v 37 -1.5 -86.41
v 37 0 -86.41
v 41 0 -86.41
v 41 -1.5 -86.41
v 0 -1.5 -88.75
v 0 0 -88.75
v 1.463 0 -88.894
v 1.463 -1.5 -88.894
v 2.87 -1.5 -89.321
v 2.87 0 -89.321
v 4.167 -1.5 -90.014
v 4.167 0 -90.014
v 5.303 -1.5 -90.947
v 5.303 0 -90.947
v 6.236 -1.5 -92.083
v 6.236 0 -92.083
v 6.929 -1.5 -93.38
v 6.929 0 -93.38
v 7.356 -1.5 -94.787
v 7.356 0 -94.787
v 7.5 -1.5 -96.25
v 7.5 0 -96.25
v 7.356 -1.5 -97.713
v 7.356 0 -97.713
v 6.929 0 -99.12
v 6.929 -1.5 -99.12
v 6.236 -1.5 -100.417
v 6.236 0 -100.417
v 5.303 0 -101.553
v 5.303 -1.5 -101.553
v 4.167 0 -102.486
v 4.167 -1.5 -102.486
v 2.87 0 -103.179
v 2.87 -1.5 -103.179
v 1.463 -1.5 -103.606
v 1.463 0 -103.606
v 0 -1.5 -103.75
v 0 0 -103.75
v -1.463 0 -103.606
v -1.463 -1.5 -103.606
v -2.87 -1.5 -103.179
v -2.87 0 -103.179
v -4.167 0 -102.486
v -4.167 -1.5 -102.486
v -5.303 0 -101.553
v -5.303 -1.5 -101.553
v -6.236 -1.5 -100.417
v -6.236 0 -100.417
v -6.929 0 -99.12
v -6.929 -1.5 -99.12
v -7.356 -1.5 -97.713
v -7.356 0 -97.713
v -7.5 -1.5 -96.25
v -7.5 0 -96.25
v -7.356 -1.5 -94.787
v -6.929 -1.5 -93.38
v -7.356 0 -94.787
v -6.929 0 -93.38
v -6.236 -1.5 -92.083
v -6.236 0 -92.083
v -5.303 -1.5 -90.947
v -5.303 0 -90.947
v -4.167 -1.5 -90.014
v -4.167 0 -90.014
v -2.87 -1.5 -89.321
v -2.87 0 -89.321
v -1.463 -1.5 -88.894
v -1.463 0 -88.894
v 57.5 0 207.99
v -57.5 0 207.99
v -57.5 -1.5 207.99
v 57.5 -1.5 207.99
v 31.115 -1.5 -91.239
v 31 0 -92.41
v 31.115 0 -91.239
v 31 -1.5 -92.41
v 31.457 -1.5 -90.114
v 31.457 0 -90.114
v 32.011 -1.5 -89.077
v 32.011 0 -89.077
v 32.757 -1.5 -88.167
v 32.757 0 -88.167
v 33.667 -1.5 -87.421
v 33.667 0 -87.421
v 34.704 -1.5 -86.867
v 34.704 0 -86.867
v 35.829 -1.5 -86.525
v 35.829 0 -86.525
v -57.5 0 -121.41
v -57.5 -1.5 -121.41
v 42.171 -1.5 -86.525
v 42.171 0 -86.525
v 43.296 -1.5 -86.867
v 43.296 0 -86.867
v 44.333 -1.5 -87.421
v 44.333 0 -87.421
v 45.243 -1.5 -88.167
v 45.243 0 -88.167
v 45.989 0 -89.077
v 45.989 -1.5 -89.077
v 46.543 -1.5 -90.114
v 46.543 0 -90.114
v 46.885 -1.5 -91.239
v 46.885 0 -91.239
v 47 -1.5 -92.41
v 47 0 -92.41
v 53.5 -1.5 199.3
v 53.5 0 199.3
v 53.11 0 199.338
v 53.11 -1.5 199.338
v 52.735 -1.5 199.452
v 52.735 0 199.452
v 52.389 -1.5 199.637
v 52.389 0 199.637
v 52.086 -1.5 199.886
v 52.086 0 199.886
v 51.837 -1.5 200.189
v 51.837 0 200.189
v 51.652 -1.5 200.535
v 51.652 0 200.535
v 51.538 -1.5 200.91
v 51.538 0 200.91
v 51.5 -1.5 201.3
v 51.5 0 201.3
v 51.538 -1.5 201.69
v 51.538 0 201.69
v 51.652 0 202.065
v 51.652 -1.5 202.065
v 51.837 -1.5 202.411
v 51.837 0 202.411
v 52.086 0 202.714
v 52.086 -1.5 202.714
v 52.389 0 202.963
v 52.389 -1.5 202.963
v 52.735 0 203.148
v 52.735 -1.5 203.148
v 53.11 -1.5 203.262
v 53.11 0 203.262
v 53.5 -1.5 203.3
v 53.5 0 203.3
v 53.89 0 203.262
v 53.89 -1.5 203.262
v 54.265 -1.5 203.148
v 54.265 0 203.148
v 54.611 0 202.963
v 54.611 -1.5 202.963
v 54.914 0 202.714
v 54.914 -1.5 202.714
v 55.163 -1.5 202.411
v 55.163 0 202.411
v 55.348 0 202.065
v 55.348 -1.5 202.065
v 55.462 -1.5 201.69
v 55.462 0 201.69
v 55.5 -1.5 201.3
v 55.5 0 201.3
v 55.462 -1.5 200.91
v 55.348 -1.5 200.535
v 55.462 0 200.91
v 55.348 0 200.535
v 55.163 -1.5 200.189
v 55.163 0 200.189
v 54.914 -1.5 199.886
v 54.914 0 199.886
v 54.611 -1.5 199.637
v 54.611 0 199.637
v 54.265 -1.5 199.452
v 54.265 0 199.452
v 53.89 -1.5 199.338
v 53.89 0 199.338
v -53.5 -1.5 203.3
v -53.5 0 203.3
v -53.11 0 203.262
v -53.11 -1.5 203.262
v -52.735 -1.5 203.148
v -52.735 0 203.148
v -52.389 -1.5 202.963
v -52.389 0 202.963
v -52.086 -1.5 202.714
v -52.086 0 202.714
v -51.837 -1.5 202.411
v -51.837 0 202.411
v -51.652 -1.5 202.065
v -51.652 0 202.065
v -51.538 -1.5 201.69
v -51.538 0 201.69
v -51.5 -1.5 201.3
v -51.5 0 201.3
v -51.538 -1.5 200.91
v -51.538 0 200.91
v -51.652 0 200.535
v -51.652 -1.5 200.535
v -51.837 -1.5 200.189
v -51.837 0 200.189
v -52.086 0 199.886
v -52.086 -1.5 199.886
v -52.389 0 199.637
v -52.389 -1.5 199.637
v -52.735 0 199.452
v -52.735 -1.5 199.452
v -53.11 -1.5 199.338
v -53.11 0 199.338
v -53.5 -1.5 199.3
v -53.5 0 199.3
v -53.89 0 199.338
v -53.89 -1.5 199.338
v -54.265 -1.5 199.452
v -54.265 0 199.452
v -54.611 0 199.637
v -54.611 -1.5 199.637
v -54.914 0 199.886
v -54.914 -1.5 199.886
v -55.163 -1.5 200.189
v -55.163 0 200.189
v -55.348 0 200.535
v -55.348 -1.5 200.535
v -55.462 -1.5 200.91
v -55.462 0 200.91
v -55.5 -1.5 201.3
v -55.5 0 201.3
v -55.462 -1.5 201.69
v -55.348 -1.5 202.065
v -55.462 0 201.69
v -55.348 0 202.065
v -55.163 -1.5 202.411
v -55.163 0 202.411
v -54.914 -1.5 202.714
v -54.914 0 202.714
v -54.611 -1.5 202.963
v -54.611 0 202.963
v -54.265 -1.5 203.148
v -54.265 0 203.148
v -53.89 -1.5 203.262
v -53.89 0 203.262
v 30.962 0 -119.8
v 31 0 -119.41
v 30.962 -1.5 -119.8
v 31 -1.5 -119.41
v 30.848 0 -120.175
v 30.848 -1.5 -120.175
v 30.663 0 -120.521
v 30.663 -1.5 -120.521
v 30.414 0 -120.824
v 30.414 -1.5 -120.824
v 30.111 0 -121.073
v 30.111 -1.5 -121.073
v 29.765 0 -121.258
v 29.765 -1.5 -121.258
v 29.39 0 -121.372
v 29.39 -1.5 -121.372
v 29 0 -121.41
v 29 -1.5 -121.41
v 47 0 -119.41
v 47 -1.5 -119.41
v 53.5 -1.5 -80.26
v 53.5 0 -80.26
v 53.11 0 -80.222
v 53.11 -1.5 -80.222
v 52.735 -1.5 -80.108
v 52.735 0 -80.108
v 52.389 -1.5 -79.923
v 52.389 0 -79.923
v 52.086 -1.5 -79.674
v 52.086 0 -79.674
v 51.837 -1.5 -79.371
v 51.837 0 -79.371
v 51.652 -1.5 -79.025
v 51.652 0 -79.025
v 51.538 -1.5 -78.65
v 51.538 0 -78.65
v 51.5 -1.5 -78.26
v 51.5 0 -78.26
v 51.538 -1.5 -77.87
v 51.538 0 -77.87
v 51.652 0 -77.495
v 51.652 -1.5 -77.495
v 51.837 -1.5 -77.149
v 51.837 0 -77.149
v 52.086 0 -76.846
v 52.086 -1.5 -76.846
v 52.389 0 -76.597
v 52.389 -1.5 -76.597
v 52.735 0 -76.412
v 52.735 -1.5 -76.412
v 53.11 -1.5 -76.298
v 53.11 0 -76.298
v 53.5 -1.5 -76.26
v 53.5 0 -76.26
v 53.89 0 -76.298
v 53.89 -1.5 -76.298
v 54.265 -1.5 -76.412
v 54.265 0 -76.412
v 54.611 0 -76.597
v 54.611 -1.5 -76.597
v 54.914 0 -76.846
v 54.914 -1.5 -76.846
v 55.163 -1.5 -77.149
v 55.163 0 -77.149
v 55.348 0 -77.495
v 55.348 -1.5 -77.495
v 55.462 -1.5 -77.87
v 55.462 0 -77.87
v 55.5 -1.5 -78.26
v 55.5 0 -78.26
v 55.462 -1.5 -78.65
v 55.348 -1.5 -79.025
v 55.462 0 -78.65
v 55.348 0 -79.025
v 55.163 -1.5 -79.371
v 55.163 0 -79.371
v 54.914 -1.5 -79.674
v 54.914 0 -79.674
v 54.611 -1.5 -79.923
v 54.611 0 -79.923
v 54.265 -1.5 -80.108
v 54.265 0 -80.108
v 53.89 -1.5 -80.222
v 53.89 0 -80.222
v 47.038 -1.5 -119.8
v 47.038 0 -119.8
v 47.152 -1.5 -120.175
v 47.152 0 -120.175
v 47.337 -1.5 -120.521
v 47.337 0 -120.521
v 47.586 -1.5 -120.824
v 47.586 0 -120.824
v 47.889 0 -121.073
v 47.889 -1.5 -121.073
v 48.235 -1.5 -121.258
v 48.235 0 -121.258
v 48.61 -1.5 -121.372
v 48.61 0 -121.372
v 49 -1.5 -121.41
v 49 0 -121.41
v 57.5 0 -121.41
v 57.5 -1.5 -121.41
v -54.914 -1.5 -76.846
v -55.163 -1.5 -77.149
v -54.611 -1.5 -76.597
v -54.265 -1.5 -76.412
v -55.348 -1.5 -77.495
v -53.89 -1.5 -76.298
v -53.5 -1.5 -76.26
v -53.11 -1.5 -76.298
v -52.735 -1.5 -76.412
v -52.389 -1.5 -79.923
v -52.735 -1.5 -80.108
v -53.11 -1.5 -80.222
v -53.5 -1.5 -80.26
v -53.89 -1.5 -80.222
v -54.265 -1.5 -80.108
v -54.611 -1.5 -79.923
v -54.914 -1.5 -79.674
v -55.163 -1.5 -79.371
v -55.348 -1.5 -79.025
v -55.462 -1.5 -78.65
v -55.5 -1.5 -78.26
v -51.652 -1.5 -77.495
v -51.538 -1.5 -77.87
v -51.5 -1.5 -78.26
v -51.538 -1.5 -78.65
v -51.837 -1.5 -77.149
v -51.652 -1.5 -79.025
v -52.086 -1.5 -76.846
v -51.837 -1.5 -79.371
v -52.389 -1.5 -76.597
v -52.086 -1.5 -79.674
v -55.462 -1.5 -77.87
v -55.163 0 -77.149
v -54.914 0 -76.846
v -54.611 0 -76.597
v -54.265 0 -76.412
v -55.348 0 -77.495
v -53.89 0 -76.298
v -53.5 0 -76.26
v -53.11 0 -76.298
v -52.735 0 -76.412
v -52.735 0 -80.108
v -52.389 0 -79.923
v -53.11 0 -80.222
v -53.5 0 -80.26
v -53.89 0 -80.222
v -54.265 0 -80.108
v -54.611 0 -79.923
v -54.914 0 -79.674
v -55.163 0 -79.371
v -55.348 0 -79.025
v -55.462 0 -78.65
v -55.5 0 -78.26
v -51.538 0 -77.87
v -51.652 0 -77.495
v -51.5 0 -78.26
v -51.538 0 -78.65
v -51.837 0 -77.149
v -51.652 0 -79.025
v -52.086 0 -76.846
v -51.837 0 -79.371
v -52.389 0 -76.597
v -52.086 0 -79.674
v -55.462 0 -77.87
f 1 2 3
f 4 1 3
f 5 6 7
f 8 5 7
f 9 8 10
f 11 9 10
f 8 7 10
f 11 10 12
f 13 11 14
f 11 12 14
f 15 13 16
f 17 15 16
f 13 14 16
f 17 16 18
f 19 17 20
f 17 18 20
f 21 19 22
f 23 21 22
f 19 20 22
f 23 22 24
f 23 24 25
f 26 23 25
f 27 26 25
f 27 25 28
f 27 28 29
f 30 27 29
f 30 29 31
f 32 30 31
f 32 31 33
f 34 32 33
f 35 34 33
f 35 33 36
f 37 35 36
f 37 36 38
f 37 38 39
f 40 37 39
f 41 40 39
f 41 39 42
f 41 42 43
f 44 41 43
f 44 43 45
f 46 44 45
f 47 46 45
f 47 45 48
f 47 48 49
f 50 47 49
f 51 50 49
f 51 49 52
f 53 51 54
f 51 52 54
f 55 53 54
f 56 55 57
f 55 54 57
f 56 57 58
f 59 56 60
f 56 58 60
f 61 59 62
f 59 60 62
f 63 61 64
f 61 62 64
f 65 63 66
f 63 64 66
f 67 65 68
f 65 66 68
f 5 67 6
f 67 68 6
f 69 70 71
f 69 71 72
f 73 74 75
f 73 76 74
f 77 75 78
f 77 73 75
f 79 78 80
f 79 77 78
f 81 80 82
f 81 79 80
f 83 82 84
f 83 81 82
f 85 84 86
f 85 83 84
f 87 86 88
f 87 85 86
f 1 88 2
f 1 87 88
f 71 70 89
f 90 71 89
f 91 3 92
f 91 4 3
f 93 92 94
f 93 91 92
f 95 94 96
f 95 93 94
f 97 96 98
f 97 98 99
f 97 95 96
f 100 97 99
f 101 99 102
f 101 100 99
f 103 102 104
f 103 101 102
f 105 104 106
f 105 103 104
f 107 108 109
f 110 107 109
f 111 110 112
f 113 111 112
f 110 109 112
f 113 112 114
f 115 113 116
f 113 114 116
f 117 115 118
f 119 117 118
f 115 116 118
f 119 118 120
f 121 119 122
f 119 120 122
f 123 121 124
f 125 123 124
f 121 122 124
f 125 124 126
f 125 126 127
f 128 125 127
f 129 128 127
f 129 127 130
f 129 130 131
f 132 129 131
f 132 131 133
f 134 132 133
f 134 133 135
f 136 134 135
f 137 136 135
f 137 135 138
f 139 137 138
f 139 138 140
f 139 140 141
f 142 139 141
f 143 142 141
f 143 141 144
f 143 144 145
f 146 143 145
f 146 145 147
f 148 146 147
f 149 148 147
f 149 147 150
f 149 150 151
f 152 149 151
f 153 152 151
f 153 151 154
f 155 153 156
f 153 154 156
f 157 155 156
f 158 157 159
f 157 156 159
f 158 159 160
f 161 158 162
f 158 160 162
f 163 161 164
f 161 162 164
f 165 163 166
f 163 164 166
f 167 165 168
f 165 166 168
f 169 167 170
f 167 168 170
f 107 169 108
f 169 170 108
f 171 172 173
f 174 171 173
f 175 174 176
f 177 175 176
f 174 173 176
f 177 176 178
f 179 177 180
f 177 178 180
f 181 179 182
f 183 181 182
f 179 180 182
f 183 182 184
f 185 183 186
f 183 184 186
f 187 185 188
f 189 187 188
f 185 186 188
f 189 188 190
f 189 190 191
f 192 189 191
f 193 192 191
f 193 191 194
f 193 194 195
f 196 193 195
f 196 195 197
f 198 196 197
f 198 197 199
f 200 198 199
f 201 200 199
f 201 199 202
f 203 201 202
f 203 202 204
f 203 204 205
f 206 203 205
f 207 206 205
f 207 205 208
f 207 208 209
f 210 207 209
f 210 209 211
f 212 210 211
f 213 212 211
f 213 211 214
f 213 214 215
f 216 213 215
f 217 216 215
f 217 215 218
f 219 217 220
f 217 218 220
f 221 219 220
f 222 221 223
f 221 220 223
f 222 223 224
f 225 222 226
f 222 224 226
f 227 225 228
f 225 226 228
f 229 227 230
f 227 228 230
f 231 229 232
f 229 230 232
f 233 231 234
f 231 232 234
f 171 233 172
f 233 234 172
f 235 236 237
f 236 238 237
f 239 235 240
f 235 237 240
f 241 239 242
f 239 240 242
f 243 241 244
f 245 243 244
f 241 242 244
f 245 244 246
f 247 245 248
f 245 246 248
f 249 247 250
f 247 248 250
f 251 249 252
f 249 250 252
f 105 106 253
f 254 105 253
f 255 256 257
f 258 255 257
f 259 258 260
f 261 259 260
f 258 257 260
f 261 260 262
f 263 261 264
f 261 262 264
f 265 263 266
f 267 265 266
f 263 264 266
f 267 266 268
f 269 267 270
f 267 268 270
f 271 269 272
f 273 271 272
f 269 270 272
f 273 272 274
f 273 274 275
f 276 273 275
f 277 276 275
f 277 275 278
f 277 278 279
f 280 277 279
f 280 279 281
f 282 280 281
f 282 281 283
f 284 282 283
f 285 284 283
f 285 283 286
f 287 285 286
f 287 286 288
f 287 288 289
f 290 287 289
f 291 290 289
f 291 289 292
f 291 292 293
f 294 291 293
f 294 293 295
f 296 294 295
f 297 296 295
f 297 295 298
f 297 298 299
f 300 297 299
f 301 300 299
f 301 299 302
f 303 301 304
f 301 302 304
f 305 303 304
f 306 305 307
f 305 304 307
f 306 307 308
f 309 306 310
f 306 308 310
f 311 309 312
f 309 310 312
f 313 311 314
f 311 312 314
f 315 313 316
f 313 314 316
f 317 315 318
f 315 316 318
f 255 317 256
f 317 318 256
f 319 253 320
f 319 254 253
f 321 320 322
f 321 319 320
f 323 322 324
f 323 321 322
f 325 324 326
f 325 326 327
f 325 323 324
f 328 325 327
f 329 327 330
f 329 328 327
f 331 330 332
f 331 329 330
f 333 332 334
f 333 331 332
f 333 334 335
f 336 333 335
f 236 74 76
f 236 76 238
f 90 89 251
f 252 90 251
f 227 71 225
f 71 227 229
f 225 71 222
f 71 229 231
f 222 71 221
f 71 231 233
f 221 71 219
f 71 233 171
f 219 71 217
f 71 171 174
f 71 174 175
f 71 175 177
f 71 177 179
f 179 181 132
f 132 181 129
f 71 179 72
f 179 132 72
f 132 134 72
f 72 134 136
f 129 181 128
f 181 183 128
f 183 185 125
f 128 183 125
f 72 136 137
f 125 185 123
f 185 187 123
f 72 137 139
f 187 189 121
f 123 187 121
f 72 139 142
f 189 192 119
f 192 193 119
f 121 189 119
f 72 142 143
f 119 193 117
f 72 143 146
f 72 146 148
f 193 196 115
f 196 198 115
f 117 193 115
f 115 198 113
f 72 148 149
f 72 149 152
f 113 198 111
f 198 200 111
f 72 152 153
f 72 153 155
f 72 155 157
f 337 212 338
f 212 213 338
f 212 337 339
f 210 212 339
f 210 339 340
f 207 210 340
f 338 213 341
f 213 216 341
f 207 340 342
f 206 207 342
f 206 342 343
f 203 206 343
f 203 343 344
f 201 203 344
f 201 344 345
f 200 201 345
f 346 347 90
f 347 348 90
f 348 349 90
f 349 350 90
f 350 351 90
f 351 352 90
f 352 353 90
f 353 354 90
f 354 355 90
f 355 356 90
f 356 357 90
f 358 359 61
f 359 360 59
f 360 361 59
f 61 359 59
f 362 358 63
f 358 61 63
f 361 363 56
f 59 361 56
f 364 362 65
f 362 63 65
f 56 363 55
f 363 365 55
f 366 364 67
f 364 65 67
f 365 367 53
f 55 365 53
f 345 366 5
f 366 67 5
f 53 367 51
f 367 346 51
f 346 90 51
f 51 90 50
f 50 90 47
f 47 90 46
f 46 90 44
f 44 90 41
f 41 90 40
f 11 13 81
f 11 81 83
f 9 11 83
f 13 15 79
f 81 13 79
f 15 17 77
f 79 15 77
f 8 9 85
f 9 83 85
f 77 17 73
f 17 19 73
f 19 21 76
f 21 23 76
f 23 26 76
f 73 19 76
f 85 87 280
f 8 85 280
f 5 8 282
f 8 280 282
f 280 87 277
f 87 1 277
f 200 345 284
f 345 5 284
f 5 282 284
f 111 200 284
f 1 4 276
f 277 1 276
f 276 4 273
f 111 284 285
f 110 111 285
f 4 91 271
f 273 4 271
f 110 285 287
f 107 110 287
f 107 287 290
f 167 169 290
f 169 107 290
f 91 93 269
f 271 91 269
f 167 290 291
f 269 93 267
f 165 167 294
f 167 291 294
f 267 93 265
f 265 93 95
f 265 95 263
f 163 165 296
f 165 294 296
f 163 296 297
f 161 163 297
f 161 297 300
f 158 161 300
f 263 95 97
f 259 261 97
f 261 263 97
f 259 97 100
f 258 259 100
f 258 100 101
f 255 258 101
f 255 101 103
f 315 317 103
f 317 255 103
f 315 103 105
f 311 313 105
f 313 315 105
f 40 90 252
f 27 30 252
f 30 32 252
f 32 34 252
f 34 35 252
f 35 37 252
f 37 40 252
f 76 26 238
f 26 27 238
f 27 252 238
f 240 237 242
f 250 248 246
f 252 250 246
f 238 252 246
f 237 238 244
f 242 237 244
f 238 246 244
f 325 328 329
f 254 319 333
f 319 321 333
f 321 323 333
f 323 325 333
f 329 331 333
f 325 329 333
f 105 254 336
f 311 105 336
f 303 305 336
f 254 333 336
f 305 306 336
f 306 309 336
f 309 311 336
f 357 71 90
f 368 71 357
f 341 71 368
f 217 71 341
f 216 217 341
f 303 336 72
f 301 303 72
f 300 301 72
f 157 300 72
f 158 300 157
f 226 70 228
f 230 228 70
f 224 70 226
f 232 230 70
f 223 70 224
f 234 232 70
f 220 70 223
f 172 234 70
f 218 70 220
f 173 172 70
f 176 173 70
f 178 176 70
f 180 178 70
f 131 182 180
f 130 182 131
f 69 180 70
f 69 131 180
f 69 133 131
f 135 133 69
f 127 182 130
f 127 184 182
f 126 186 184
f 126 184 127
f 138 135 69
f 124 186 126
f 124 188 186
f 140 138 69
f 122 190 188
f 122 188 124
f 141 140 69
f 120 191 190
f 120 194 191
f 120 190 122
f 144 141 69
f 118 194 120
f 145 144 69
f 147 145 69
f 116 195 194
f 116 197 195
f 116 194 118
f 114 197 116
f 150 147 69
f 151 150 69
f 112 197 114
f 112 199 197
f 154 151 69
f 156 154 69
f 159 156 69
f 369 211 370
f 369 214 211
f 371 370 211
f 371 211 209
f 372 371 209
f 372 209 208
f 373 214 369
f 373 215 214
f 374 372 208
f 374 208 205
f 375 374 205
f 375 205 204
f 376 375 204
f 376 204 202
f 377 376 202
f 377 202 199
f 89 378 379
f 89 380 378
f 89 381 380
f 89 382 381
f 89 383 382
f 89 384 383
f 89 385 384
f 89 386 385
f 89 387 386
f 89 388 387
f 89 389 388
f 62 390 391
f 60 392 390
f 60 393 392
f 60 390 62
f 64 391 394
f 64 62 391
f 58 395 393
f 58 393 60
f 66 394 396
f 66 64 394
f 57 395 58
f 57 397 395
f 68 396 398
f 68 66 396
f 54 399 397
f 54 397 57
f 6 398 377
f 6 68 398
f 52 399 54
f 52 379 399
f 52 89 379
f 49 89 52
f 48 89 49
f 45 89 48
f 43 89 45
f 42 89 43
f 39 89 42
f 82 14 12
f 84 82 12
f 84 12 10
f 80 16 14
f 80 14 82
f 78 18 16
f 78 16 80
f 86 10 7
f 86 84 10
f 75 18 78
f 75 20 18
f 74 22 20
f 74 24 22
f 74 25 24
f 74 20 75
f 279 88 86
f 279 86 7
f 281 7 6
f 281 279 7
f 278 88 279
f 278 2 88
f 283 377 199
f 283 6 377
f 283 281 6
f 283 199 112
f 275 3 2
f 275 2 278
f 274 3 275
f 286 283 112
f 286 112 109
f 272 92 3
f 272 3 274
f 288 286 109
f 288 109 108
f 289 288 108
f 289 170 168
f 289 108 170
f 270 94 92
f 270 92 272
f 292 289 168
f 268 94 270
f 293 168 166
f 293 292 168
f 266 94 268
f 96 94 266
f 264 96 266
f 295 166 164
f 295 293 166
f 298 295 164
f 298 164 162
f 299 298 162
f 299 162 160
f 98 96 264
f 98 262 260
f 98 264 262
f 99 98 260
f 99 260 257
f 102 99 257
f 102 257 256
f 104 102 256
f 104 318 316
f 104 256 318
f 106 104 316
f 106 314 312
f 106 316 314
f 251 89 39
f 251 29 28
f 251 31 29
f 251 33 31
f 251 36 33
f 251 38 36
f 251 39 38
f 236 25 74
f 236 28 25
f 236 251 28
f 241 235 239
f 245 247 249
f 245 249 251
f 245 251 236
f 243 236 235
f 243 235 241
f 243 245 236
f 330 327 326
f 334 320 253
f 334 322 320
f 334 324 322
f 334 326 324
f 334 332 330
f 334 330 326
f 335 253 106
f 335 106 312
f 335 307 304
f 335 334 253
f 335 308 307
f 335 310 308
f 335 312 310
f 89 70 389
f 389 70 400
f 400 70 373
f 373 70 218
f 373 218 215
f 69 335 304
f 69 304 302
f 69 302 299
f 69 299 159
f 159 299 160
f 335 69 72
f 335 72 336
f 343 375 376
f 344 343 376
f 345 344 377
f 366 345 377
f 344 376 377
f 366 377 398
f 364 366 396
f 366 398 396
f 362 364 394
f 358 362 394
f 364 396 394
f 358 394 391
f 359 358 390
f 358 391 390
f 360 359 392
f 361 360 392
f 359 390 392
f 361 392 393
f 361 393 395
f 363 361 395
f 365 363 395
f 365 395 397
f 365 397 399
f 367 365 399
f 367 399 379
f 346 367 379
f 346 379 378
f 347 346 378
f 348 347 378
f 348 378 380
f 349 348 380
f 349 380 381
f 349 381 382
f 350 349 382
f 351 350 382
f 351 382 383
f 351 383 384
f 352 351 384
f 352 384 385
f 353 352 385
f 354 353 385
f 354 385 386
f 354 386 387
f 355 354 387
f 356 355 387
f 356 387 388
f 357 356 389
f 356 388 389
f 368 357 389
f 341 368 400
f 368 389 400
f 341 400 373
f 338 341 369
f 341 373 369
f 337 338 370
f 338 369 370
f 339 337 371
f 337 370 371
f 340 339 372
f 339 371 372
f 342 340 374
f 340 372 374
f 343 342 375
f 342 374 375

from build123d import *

# Parameters (mm, degrees)
CROQUIS12_W           = 115
CROQUIS12_H           = 329.4
BRIDA_BASE2_DEPTH     = 1.5
CORTAR_EXTRUIR6_REACH = 217.797
CROQUIS27_R           = 2
CORTAR_EXTRUIR7_REACH = 217.797
CROQUIS28_R           = 7.5
CROQUIS29_W           = 16
CROQUIS29_H           = 35
CORTAR_EXTRUIR8_DEPTH = 216.796988162
REDONDEO1_R           = 6
REDONDEO2_R           = 2


# Sheet-metal steps are written as plain solids
with BuildPart() as part:
    # Croquis12 → Brida base2 (new body)
    with BuildSketch(Plane(origin=(0, 0, 0), x_dir=(1, 0, 0), z_dir=(0, 1, 0))):
        with Locations((0, -43.29)):
            Rectangle(CROQUIS12_W, CROQUIS12_H)
    extrude(amount=-BRIDA_BASE2_DEPTH)

    # Croquis27 → Cortar-Extruir6 (cut, up to next)
    with BuildSketch(Plane(origin=(0, 0, 0), x_dir=(1, 0, 0), z_dir=(0, 1, 0)), mode=Mode.PRIVATE) as cortar_extruir6_sk1:
        with Locations(Location((-53.5, -201.3, 0), (0, 0, 270))):
            Circle(CROQUIS27_R)
    cortar_extruir6_tool1 = extrude(cortar_extruir6_sk1.sketch, amount=-CORTAR_EXTRUIR6_REACH, mode=Mode.PRIVATE) & part.part
    # Croquis27 → Cortar-Extruir6 (cut, up to next)
    with BuildSketch(Plane(origin=(0, 0, 0), x_dir=(1, 0, 0), z_dir=(0, 1, 0)), mode=Mode.PRIVATE) as cortar_extruir6_sk2:
        with Locations(Location((-53.5, 78.26, 0), (0, 0, 270))):
            Circle(CROQUIS27_R)
    cortar_extruir6_tool2 = extrude(cortar_extruir6_sk2.sketch, amount=-CORTAR_EXTRUIR6_REACH, mode=Mode.PRIVATE) & part.part
    # Croquis27 → Cortar-Extruir6 (cut, up to next)
    with BuildSketch(Plane(origin=(0, 0, 0), x_dir=(1, 0, 0), z_dir=(0, 1, 0)), mode=Mode.PRIVATE) as cortar_extruir6_sk3:
        with Locations(Location((53.5, 78.26, 0), (0, 0, 90))):
            Circle(CROQUIS27_R)
    cortar_extruir6_tool3 = extrude(cortar_extruir6_sk3.sketch, amount=-CORTAR_EXTRUIR6_REACH, mode=Mode.PRIVATE) & part.part
    # Croquis27 → Cortar-Extruir6 (cut, up to next)
    with BuildSketch(Plane(origin=(0, 0, 0), x_dir=(1, 0, 0), z_dir=(0, 1, 0)), mode=Mode.PRIVATE) as cortar_extruir6_sk4:
        with Locations(Location((53.5, -201.3, 0), (0, 0, 90))):
            Circle(CROQUIS27_R)
    cortar_extruir6_tool4 = extrude(cortar_extruir6_sk4.sketch, amount=-CORTAR_EXTRUIR6_REACH, mode=Mode.PRIVATE) & part.part
    add(cortar_extruir6_tool1.solids().sort_by_distance((-53.5, 0, 201.3))[0], mode=Mode.SUBTRACT)
    add(cortar_extruir6_tool2.solids().sort_by_distance((-53.5, 0, -78.26))[0], mode=Mode.SUBTRACT)
    add(cortar_extruir6_tool3.solids().sort_by_distance((53.5, 0, -78.26))[0], mode=Mode.SUBTRACT)
    add(cortar_extruir6_tool4.solids().sort_by_distance((53.5, 0, 201.3))[0], mode=Mode.SUBTRACT)

    # Croquis28 → Cortar-Extruir7 (cut, up to next)
    with BuildSketch(Plane(origin=(0, 0, 0), x_dir=(1, 0, 0), z_dir=(0, 1, 0)), mode=Mode.PRIVATE) as cortar_extruir7_sk1:
        with Locations(Location((0, 96.25, 0), (0, 0, 270))):
            Circle(CROQUIS28_R)
    cortar_extruir7_tool1 = extrude(cortar_extruir7_sk1.sketch, amount=-CORTAR_EXTRUIR7_REACH, mode=Mode.PRIVATE) & part.part
    add(cortar_extruir7_tool1.solids().sort_by_distance((0, 0, -96.25))[0], mode=Mode.SUBTRACT)

    # Croquis29 → Cortar-Extruir8 (cut, through all)
    with BuildSketch(Plane(origin=(0, 0, 0), x_dir=(1, 0, 0), z_dir=(0, 1, 0))):
        with Locations((39, 103.91)):
            Rectangle(CROQUIS29_W, CROQUIS29_H)
    extrude(amount=-CORTAR_EXTRUIR8_DEPTH, mode=Mode.SUBTRACT)

    # Redondeo1
    redondeo1_edges = [part.edges().sort_by_distance(p)[0] for p in [
        (31, -0.75, -86.41),
        (47, -0.75, -86.41),
    ]]
    fillet(redondeo1_edges, radius=REDONDEO1_R)

    # Redondeo2
    redondeo2_edges = [part.edges().sort_by_distance(p)[0] for p in [
        (31, -0.75, -121.41),
        (47, -0.75, -121.41),
    ]]
    fillet(redondeo2_edges, radius=REDONDEO2_R)


solid = part.part
